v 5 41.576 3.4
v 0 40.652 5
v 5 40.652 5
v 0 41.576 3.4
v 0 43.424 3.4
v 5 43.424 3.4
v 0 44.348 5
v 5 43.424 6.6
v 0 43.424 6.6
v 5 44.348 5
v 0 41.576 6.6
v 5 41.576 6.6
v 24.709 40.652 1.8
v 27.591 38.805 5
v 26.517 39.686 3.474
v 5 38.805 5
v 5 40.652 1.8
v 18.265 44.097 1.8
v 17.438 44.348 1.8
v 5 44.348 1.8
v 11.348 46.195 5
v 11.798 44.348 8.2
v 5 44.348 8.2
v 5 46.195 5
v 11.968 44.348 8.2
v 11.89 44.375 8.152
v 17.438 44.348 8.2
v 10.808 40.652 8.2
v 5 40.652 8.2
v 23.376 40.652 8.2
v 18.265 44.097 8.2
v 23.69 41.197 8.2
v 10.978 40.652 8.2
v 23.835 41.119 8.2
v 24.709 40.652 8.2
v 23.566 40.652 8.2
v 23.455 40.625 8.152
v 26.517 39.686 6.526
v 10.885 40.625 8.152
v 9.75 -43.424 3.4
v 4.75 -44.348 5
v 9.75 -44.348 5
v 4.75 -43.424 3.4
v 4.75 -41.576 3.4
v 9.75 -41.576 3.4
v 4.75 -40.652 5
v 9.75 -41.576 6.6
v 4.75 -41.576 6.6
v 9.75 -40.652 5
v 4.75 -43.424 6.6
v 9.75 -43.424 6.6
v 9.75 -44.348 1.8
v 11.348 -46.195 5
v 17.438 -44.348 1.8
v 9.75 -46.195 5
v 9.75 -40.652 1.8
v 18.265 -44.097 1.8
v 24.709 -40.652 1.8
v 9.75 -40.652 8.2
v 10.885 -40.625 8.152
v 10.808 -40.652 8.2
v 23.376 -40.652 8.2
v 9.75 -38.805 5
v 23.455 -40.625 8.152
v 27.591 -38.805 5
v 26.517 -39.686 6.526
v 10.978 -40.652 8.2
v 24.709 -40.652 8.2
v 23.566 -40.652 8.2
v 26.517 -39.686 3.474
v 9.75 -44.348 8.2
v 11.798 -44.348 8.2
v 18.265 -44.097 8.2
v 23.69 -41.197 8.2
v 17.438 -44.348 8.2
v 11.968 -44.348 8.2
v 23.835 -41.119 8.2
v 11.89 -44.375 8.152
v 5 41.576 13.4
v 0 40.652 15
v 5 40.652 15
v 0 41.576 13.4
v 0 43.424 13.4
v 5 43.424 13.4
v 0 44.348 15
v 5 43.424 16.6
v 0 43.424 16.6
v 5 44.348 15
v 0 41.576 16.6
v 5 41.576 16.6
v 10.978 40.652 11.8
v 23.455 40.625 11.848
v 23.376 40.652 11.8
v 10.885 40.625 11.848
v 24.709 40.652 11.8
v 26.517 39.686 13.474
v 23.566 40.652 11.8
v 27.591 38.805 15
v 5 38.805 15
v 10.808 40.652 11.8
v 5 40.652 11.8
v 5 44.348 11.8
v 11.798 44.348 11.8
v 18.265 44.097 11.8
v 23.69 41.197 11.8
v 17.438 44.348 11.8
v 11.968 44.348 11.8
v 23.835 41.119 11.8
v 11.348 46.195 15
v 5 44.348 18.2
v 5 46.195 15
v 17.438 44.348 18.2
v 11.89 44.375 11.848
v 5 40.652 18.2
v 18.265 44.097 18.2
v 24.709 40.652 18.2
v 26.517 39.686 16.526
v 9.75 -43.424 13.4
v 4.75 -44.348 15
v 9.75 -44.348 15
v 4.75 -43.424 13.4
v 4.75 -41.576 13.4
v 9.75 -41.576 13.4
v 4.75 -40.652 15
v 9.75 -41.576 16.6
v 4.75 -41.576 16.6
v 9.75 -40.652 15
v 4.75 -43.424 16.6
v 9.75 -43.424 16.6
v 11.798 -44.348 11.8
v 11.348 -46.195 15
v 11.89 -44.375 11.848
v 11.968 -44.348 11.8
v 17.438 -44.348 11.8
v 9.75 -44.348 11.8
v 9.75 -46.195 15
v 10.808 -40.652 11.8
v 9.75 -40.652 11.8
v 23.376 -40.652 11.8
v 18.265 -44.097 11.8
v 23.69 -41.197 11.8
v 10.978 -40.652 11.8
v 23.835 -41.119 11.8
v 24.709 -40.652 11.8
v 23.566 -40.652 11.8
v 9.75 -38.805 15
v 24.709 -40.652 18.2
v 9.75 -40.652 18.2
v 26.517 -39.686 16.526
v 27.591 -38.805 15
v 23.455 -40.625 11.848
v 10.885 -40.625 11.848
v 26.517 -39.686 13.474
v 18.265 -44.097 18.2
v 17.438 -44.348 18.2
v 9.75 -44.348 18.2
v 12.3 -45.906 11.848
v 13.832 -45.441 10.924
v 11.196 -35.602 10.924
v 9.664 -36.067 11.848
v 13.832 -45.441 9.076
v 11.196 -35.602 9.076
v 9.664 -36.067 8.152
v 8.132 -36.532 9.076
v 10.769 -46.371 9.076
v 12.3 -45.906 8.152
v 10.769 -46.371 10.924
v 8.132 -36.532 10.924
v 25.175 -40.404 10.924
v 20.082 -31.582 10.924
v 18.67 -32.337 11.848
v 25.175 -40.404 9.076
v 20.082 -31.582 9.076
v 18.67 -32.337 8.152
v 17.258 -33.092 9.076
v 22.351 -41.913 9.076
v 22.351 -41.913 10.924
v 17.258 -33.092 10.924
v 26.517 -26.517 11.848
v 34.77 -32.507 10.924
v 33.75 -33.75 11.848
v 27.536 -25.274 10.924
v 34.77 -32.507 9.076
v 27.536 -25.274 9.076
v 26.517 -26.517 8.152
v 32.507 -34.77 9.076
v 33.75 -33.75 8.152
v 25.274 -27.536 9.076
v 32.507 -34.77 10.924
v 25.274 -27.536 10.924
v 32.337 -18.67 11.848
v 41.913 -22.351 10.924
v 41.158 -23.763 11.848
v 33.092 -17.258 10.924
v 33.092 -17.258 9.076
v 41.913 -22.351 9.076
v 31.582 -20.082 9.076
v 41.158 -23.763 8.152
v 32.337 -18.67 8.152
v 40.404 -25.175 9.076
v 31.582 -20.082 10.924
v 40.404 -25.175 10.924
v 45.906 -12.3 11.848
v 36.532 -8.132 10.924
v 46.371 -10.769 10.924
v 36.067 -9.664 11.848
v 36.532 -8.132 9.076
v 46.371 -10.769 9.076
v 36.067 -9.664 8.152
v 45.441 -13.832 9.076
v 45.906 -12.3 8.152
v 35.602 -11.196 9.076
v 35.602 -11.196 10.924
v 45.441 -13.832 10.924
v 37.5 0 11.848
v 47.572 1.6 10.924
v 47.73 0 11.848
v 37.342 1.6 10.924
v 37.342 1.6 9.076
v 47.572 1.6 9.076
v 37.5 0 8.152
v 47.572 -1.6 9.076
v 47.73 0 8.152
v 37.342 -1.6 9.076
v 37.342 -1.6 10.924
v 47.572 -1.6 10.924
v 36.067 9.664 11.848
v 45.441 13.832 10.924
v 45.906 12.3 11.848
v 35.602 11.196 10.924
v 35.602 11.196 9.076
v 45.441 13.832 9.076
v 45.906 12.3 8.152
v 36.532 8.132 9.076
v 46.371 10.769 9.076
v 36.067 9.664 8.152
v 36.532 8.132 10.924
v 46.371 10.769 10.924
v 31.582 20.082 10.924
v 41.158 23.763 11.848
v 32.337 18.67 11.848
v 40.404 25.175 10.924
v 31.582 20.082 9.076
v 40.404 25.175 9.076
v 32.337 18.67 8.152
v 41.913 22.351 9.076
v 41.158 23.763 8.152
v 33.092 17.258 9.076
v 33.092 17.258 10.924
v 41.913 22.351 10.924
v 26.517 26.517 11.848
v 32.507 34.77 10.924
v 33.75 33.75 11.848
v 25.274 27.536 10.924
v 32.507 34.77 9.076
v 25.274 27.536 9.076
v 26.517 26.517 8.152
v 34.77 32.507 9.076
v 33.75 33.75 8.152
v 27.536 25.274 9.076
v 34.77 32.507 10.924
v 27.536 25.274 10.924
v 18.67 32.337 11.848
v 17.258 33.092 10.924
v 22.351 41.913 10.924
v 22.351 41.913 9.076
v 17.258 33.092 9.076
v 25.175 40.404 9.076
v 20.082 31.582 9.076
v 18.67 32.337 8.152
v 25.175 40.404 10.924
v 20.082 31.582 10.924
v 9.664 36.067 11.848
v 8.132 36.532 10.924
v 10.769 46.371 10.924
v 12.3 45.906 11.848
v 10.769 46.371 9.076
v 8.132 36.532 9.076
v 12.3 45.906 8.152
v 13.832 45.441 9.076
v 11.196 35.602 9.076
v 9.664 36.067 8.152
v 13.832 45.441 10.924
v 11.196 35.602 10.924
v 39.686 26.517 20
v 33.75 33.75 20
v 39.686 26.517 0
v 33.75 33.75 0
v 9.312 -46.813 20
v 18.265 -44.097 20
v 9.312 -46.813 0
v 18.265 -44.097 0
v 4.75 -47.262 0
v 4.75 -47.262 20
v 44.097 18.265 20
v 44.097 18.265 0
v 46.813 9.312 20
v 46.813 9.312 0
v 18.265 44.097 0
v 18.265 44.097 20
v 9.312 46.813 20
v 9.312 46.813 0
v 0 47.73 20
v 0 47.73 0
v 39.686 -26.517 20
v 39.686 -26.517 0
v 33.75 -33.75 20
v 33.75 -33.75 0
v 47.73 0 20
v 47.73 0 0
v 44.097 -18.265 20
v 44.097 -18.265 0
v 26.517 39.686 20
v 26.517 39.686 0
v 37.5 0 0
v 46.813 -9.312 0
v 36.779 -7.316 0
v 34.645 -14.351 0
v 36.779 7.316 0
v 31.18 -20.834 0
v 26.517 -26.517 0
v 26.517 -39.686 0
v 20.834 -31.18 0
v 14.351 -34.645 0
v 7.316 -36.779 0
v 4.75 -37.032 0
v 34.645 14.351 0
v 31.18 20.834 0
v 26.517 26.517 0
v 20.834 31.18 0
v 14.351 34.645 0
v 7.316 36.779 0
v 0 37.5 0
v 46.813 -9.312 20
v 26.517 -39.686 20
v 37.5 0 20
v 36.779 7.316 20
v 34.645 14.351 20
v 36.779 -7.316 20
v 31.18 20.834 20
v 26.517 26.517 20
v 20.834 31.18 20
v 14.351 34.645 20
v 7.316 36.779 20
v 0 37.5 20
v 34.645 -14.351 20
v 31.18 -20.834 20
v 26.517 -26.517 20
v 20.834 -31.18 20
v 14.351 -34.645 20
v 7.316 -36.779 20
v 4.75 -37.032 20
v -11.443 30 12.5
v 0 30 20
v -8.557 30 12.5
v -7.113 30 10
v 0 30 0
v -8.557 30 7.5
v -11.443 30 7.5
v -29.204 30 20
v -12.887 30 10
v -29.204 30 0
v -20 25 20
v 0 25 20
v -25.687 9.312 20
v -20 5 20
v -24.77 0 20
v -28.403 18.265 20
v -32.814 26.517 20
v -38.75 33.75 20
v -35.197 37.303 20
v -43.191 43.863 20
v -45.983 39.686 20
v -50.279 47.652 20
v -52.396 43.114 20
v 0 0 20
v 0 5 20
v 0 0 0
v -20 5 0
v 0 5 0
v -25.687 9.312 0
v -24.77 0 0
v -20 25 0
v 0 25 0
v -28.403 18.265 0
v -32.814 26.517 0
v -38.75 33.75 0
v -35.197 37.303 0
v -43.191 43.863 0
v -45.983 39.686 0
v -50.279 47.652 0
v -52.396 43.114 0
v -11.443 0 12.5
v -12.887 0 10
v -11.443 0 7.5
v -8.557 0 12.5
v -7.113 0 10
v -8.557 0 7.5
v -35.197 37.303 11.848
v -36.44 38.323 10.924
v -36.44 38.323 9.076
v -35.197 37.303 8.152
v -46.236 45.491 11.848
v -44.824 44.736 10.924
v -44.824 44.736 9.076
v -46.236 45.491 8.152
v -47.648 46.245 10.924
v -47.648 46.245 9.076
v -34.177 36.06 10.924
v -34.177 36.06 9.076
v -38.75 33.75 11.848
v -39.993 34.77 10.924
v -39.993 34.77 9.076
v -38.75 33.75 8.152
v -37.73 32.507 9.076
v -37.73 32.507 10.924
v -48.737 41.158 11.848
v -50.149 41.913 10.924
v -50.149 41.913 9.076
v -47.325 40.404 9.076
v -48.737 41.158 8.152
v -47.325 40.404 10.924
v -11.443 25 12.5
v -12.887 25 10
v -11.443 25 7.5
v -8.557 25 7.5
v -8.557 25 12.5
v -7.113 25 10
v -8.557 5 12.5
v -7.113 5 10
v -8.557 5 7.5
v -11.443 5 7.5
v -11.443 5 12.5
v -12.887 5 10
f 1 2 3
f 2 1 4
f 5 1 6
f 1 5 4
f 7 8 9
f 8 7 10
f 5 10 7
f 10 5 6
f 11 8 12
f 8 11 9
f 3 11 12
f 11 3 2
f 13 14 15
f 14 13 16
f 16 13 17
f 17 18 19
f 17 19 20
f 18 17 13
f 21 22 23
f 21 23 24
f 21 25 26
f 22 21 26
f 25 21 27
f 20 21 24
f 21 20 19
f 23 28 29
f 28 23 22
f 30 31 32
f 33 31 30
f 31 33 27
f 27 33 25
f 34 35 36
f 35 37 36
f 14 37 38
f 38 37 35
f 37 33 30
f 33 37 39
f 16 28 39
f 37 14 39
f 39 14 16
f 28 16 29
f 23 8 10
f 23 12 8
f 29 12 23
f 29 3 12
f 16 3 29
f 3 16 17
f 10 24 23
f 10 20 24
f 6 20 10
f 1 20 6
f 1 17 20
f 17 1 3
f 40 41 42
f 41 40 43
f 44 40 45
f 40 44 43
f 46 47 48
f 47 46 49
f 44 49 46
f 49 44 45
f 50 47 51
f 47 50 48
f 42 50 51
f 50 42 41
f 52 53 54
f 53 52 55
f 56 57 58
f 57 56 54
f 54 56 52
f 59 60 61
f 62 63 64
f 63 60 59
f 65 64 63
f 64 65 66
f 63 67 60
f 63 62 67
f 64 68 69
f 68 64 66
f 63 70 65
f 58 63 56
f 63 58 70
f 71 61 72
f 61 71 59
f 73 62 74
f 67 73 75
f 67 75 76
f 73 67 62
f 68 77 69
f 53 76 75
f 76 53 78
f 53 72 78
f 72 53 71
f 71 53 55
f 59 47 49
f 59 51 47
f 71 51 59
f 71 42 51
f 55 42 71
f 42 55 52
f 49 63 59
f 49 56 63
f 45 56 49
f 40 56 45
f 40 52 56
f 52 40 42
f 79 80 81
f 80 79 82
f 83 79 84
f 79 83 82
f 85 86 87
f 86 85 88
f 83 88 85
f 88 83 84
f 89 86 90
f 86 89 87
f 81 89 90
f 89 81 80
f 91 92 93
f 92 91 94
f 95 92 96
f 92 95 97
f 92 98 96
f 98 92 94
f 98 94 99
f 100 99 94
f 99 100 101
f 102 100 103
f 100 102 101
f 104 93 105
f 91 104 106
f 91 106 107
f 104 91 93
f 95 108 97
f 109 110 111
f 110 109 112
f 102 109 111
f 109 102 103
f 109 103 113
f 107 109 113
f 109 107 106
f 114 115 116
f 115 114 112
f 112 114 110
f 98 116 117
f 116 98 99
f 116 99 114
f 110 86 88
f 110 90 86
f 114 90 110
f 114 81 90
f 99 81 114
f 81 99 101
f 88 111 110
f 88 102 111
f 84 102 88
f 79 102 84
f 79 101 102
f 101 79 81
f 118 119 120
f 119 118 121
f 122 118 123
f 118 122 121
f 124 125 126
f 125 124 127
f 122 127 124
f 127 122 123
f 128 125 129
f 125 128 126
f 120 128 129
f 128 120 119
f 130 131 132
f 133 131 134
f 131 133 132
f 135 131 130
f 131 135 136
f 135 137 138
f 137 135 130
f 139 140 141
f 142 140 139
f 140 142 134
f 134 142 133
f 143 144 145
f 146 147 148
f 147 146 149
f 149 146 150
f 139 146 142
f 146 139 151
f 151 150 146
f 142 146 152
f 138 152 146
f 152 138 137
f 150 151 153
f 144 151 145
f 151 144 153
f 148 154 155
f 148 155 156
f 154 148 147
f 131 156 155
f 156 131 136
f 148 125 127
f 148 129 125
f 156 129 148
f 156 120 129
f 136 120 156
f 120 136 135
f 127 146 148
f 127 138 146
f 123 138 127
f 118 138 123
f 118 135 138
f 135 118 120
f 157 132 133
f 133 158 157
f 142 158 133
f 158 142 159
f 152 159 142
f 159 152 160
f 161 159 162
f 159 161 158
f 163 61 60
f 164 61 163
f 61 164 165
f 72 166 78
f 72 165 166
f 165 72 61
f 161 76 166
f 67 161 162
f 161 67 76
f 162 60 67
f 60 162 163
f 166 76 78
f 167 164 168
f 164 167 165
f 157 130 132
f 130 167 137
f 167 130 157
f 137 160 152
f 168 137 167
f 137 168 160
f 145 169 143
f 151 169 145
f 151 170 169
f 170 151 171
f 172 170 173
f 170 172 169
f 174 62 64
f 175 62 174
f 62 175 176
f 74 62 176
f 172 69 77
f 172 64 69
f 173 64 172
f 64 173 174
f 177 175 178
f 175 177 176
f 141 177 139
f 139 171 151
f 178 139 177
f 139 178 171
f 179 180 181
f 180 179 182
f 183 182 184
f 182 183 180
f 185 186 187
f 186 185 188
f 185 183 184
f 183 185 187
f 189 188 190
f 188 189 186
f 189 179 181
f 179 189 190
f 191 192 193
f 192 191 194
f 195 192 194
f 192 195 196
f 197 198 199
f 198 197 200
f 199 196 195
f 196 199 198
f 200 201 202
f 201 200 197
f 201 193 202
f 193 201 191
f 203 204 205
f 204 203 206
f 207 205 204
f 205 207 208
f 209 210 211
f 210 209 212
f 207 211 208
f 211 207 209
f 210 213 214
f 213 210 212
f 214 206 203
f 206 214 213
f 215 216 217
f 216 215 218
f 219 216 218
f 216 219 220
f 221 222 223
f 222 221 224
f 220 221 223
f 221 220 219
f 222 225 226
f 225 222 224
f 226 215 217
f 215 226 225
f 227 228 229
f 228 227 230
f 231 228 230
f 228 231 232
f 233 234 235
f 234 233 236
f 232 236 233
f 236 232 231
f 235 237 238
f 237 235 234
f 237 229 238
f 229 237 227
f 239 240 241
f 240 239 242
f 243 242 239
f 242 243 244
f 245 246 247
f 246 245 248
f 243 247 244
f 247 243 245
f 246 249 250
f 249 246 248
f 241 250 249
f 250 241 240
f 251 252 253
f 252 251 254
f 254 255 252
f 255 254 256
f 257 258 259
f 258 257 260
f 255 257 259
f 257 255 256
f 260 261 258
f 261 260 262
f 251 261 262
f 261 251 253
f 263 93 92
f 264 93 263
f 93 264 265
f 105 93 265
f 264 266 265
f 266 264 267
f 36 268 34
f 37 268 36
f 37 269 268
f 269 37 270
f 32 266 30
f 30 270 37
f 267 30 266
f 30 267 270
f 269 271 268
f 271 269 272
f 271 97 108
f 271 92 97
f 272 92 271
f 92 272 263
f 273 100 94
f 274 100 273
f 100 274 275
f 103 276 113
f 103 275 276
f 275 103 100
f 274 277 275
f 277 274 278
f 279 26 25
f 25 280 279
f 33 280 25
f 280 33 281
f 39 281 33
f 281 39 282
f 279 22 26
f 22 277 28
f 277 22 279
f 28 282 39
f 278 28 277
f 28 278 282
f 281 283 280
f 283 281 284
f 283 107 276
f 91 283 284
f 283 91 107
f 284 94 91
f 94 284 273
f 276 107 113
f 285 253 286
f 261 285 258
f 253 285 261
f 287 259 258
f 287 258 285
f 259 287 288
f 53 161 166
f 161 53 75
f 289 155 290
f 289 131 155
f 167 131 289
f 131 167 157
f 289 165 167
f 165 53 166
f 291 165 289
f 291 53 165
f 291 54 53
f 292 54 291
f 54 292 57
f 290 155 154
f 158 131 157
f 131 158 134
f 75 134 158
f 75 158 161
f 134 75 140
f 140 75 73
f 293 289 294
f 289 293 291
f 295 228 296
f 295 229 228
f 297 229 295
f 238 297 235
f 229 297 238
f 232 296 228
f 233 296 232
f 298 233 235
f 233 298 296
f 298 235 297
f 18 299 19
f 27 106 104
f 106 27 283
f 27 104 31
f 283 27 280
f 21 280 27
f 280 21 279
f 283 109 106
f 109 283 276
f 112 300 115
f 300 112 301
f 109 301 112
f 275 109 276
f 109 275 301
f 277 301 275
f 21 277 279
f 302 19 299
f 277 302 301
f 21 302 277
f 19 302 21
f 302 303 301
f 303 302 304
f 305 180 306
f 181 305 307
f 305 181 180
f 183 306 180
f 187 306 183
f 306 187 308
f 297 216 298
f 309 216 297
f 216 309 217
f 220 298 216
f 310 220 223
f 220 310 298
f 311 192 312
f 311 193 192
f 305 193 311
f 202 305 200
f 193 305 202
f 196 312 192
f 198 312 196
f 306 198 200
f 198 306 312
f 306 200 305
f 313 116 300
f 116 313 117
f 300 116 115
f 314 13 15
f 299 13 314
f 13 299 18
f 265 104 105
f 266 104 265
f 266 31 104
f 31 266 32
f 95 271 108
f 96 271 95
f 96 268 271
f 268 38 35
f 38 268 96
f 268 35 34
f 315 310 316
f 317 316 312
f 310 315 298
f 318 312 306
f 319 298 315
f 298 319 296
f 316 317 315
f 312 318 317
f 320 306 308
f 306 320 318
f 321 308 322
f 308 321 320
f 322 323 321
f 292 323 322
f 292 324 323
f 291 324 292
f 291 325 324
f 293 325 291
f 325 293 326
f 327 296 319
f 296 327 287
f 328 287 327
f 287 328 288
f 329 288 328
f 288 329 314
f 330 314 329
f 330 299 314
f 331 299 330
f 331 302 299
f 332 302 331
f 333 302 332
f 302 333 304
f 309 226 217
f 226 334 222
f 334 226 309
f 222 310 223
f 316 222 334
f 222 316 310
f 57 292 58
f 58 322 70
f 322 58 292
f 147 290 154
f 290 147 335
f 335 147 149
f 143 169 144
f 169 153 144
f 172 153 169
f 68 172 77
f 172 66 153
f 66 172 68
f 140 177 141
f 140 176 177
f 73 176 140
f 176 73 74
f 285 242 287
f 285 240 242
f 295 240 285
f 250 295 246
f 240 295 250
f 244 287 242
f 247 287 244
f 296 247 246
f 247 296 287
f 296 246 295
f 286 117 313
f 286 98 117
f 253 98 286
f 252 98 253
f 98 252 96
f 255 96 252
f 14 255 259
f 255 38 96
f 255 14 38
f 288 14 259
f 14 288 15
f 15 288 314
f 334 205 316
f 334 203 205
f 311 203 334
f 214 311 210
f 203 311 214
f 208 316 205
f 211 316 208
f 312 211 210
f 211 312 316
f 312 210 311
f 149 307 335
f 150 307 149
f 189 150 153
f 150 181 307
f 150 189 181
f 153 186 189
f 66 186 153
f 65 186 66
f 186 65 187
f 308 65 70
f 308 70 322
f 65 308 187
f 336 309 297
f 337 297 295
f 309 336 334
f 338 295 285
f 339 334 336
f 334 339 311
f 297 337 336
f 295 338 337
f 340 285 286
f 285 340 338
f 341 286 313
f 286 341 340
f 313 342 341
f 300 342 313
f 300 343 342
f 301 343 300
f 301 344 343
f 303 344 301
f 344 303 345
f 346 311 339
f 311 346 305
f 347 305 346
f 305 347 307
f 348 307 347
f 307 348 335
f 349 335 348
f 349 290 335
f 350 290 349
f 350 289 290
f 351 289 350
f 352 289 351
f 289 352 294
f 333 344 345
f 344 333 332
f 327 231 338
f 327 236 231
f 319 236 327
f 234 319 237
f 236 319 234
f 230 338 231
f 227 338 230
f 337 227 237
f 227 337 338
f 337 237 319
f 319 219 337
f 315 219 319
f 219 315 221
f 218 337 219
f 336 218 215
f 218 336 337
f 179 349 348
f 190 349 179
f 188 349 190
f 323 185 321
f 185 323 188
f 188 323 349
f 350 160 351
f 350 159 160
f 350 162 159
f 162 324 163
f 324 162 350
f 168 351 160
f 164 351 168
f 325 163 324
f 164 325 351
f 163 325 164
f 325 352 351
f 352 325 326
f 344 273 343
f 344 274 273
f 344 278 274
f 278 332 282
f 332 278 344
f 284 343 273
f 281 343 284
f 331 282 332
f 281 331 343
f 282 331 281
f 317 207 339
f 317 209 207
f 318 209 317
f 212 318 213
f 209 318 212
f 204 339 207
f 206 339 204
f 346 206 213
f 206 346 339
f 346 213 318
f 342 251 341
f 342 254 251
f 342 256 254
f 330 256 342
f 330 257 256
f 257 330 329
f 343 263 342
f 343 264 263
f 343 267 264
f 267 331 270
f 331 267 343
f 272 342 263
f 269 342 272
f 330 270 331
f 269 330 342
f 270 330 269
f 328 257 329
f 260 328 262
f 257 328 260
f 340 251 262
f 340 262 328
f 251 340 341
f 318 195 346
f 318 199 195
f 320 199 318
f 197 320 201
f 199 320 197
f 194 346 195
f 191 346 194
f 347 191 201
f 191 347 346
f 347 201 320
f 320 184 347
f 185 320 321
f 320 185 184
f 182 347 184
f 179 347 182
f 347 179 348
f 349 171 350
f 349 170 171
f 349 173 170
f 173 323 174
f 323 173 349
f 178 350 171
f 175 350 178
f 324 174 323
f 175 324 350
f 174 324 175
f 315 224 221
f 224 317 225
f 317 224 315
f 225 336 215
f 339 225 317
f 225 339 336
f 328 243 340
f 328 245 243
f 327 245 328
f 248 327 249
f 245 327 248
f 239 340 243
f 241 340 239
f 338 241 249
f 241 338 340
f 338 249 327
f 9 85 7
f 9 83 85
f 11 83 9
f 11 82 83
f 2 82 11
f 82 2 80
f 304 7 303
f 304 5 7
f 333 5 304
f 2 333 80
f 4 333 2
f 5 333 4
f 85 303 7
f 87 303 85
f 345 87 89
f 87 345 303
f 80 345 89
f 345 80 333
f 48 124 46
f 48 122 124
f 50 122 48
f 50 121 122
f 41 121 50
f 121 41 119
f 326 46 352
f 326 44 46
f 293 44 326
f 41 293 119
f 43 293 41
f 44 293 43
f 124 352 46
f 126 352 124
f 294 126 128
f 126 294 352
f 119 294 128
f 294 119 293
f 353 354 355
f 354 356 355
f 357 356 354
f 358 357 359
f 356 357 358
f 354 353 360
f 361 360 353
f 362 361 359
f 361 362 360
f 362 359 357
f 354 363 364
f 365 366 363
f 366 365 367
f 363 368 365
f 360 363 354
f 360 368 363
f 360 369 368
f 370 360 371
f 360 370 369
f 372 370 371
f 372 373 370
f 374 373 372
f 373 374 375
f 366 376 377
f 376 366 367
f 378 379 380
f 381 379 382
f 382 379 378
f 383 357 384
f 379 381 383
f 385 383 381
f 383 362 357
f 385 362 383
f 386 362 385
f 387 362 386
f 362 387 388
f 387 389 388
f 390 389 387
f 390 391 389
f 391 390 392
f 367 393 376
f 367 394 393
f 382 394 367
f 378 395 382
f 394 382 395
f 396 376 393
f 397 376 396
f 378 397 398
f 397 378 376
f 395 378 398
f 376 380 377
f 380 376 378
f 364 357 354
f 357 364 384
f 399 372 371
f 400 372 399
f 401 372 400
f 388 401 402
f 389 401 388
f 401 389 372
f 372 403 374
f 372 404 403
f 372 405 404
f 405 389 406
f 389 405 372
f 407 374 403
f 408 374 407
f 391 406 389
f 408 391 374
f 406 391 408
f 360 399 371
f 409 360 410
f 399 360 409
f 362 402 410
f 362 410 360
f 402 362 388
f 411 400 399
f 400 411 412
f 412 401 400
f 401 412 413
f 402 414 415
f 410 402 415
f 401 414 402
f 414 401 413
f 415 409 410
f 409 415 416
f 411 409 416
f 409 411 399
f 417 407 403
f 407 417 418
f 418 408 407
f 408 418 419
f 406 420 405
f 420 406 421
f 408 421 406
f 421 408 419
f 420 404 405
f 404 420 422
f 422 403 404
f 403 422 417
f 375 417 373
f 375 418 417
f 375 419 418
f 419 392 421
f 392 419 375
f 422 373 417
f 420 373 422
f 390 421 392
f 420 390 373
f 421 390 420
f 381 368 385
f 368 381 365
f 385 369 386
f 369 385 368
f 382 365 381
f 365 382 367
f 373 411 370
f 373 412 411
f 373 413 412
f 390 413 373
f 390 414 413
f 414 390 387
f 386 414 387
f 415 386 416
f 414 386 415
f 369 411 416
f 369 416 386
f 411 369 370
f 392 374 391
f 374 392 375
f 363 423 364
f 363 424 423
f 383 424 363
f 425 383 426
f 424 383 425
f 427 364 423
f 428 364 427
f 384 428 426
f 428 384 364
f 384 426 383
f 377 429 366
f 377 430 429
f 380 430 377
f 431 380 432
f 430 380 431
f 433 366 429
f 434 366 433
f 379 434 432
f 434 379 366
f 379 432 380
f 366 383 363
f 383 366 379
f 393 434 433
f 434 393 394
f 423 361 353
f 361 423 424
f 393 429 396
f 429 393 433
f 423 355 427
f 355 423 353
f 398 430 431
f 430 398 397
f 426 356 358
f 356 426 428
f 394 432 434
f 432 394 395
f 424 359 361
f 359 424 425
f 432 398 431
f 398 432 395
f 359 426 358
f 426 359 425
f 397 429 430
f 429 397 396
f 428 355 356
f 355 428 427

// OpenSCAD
// file: vars.scad
// Variables used throughout design.
// Yes, these could use some commenting.
// (c) 2014, Christopher "ScribbleJ" Jansen
huge=500;

printer_w = 400;
printer_l = 400;
printer_h = 400;

bearing_w = 7;
bearing_d = 22;
bearing_r = bearing_d/2;
bearing_hole_d = 8;
bearing_hole_r = bearing_hole_d/2;


misc_bolt_d = 3.2;
misc_bolt_r = misc_bolt_d/2;
misc_nut_r  = misc_bolt_d;
misc_bolt_pitch = 0.5;
misc_bolthead_d = misc_bolt_d*2;
misc_bolthead_r = misc_bolthead_d/2;

retainer_shell_thick = 0.5;
retainer_shell_sep   = 0.25;
//retainer_lip_thick   = 1;
retainer_lip_thick   = 2;
retainer_inner_width = 1;

belt_w    = 6;
belt_thick= 2;
belt_sep  = retainer_lip_thick*2 + 2;

calc_retainer_h  = retainer_lip_thick*2 + belt_w;
calc_retainer_ir = bearing_r + retainer_shell_thick*2 + retainer_shell_sep;
calc_retainer_or = calc_retainer_ir + belt_thick;
calc_retainer_b_off = retainer_lip_thick - (bearing_w-belt_w)/2;

tslot_w = 20;
tslot_bolt_d = 5;
tslot_bolt_r = tslot_bolt_d/2;
tslot_bolt_l = 4;
tslot_bolthead_d = 10;
tslot_bolthead_r = tslot_bolthead_d/2;


corner_thick = 5;
corner_length = tslot_w*3;

rod_d=8;
rod_r=rod_d/2;

bushing_d=15;
bushing_r=bushing_d/2;
bushing_l=10;
bushing_flange_r = bushing_r+3;
bushing_flange_w = 1;
bushing_material_thick = 5;

x_rod_sep = 50;
x_carriage_l = 50;
x_mount_sep_x = x_carriage_l - misc_bolthead_r*2*2 - misc_bolt_r*2;
x_mount_offset = bushing_r + misc_bolt_r * 2;
belt_above_x = bushing_r+misc_nut_r*2;
belt_clamp_w = 7;
x_rod_past_bearing = 20;

//belt_above_y = belt_above_x + x_rod_sep/2;
//y_above_x = belt_above_x-belt_above_y;
belt_above_y = 45;
y_above_x = belt_above_x-belt_above_y;




bearing_mount_base = corner_thick;
bearing_mount_extra = 2;
belt_above_bearing_mount = bearing_mount_base + bearing_mount_extra + retainer_lip_thick;
bearing_mount_support_tweak = 30;

y_bearing_offset = bushing_r+bushing_material_thick-calc_retainer_ir;

y_bearing_sep_y = calc_retainer_ir*2+belt_thick;
y_bearing_sep_z = belt_w+belt_sep;
bearing_bolt_r  = 4;
bearing_bolt_pitch = 1.25;
bearing_bolt_holder_thick = 4;
y_carriage_from_tslot = 2;

y_carriage_len = 50;

motor_w = 42.3;
motor_h = motor_w;
motor_bolt_sep = 31.0;
motor_bolt_r   = 1.5;
motor_pulley_d = 10;
motor_pulley_r = motor_pulley_d/2;
motor_pulley_h = 5.3;
motor_flange_d = 23;
motor_flange_r = motor_flange_d/2;
motor_corner_extra_hole_pos = tslot_bolt_r+3;

calc_corner_from_y_rod = x_rod_past_bearing+corner_thick+y_carriage_from_tslot+tslot_w;
calc_corner_above_x = belt_above_x - belt_above_bearing_mount + bearing_mount_base;

calc_motor1_above_x  = belt_above_x - motor_pulley_h;
calc_motor2_above_x  = belt_above_x - motor_pulley_h + belt_w + belt_sep;
calc_motor_from_y_rod = -bushing_r - bushing_material_thick + bearing_bolt_holder_thick + bearing_bolt_r + calc_retainer_or + motor_pulley_r;

motor_bracket_thick = 12;
motor_bracket_wide = (motor_w - motor_flange_d) / 2;
motor_bracket_len  = motor_w;
motor_bolt_offset  = (motor_w - motor_bolt_sep) / 2;

z_rod_sep = 150;
z_motor_off = motor_h - tslot_w - corner_thick;

laser_mat_thick = 4.75;
laser_mat_margin = laser_mat_thick;
bed_mount_sep   = 209;
bed_from_z      = 60;
bed_box_r       = 25;
bed_box_h       = 50;
z_ends_sep = printer_l - tslot_w*2 - corner_thick*2 - motor_w;
platform_l      =  laser_mat_margin*2 + laser_mat_thick*2 + bed_box_r*2 + z_ends_sep;
platform_w      = bed_mount_sep + misc_bolt_r*2 + laser_mat_margin*2;
z_leadscrew_passthrough_r = 12/2;
leadscrew_bolt_offset = 22/2;
leadscrew_bolt_r = 3.2/2;
laser_bushing_fudge = 0.1;


lm8uu_d=15;
lm8uu_r=lm8uu_d/2;
lm8uu_bolt_r=5/2;
lm8uu_nut_r=10/2;

arduino_width=60;
// file: common.scad
// Common functions used in various places throughout.
// (c) 2014, Christopher "ScribbleJ" Jansen
include <vars.scad>

// Reduce radius of holes intended to hold bolts by threads.
// 0.86603 * p = nominal depth of threads.  1/3-1/2 of that is about right.
function smallhole(r,p) = r - ((p*0.86603)/3);

// Polyhole derived from Nophead's Polyhole work: http://hydraraptor.blogspot.com/2011/02/polyholes.html
module polyhole(r,h,v=6,a=0)
{
  rotate([0,0,a]) cylinder( h = h, r = r  / cos( 180 / v ), $fn = v );
}
// 2D version of Polyhole
module polycircle(r,v=6,a=0)
{
  rotate([0,0,a]) circle(r = r  / cos( 180 / v ), $fn = v );
}
// Cutout for bolthole
module bolt(bolt_r = misc_bolt_r,bolthead_r = misc_bolthead_r,bolt_len = huge,v=6,a=0)
{
  translate([0,0,-bolt_len]) polyhole(r=bolt_r,h=bolt_len+1,v=v,a=a);
  polyhole(r=bolthead_r,h=huge,v=v,a=a);
}
// 2D ring
module ring(inner=5,outer=10,v=32)
{
  difference()
  {
    circle(r=outer);
    polycircle(r=inner,v=v);
  }
} 
// 2D Rounded square
module roundsquare(dim=[50,50],r=5)
{
  translate([0,r]) square([dim[0], dim[1] - r*2]);
  translate([r,0]) square([dim[0] - r*2, dim[1]]);
  for(x=[r,dim[0]-r])
  for(y=[r,dim[1]-r])
    translate([x,y]) circle(r=r);
}
// Lasercutting Tabs
module maketabs(l=100,w=5,num=10)
{
  tablength=l/(num * 2);
  for(x=[tablength/2:tablength*2:l])
    translate([x,0]) square([tablength,w]);
}
// Support for printing bearing mount
module support(l=bearing_mount_base+bearing_mount_extra+y_bearing_sep_z+calc_retainer_b_off,w=bearing_hole_d * tan(180/6) *2,extra=0,extra_l=0)
{
  translate([-w/2,0,-l]) 
  {
    difference()
    {
      rotate([45,0,0]) cube([w,huge/2,huge/2]);
      translate([-huge/2,0,0]) cube([huge,huge,huge]);
      translate([-huge/2,-huge/2,l]) cube([huge,huge,huge]);
    }
    translate([0,-extra,-extra_l/2]) cube([w,extra,extra_l]);
  }

}
// main file
// T-slot Mounting for RepRapDiscount Full Graphic LCD.
// Print 2 of crescent(), 2 of mount().
// (c) 2014, Christopher "ScribbleJ" Jansen
include <common.scad>

bolt_sep = 85;
bolt_z   = 4.75;
segments = 32;

crescent();
rotate([0,0,90]) mount();

module mount()
{
  difference()
  {
    union()
    {
      cube([tslot_w+corner_thick*2,tslot_w+corner_thick*4,tslot_w]);
      translate([0,bolt_sep/2 + corner_thick*2+tslot_w,0])
        polyhole(r=bolt_sep/2 + corner_thick*2,h=tslot_w,v=segments);
    }
    translate([corner_thick,-1,-1]) cube([tslot_w,tslot_w+1,huge]);
    translate([-1,tslot_w/2,tslot_w/2]) rotate([0,90,0]) polyhole(r=tslot_bolt_r, h=huge,a=360/12);

    translate([0,bolt_sep/2 + corner_thick*2+tslot_w,0])
    {
      translate([0,0,-1]) polyhole(r=bolt_sep/2 + corner_thick,h=huge,v=segments);
      // Mounting holes
      rotate([0,0,45]) translate([0,0,tslot_w/2]) rotate([-90,0,0]) bolt(a=360/12);
      rotate([0,0,60]) translate([0,0,tslot_w/2]) rotate([-90,0,0]) bolt(a=360/12);

      translate([-huge,-huge/2,-1]) cube([huge,huge,huge]);
      rotate([0,0,-25]) translate([-huge/2,0,-1]) cube([huge,huge,huge]);
    }
  }

}
module crescent()
{
  difference()
  {
    polyhole(r=bolt_sep/2 + corner_thick,h=tslot_w,v=segments);
    translate([0,0,-1]) cylinder(r=bolt_sep/2 - corner_thick,h=huge,$fn=segments);

    // Remove one half
    translate([-huge,-huge/2,-1]) cube([huge,huge,huge]);
    // Trim down one end
    translate([-huge + bolt_z, -huge, -1]) cube([huge,huge,huge]);

    // Display attachment bolts
    for(z=[corner_thick,tslot_w-corner_thick])
    {
      translate([corner_thick, bolt_sep/2,z]) rotate([0,90,0]) bolt(a=360/12);
      translate([corner_thick+bolt_z, -bolt_sep/2,z]) rotate([0,90,0]) bolt(a=360/12);
    }

    // Mounting holes
    for(a=[15:15:180-15])
      rotate([0,0,a]) translate([0,0,tslot_w/2]) rotate([-90,0,0]) bolt(a=360/12);

  }
}
